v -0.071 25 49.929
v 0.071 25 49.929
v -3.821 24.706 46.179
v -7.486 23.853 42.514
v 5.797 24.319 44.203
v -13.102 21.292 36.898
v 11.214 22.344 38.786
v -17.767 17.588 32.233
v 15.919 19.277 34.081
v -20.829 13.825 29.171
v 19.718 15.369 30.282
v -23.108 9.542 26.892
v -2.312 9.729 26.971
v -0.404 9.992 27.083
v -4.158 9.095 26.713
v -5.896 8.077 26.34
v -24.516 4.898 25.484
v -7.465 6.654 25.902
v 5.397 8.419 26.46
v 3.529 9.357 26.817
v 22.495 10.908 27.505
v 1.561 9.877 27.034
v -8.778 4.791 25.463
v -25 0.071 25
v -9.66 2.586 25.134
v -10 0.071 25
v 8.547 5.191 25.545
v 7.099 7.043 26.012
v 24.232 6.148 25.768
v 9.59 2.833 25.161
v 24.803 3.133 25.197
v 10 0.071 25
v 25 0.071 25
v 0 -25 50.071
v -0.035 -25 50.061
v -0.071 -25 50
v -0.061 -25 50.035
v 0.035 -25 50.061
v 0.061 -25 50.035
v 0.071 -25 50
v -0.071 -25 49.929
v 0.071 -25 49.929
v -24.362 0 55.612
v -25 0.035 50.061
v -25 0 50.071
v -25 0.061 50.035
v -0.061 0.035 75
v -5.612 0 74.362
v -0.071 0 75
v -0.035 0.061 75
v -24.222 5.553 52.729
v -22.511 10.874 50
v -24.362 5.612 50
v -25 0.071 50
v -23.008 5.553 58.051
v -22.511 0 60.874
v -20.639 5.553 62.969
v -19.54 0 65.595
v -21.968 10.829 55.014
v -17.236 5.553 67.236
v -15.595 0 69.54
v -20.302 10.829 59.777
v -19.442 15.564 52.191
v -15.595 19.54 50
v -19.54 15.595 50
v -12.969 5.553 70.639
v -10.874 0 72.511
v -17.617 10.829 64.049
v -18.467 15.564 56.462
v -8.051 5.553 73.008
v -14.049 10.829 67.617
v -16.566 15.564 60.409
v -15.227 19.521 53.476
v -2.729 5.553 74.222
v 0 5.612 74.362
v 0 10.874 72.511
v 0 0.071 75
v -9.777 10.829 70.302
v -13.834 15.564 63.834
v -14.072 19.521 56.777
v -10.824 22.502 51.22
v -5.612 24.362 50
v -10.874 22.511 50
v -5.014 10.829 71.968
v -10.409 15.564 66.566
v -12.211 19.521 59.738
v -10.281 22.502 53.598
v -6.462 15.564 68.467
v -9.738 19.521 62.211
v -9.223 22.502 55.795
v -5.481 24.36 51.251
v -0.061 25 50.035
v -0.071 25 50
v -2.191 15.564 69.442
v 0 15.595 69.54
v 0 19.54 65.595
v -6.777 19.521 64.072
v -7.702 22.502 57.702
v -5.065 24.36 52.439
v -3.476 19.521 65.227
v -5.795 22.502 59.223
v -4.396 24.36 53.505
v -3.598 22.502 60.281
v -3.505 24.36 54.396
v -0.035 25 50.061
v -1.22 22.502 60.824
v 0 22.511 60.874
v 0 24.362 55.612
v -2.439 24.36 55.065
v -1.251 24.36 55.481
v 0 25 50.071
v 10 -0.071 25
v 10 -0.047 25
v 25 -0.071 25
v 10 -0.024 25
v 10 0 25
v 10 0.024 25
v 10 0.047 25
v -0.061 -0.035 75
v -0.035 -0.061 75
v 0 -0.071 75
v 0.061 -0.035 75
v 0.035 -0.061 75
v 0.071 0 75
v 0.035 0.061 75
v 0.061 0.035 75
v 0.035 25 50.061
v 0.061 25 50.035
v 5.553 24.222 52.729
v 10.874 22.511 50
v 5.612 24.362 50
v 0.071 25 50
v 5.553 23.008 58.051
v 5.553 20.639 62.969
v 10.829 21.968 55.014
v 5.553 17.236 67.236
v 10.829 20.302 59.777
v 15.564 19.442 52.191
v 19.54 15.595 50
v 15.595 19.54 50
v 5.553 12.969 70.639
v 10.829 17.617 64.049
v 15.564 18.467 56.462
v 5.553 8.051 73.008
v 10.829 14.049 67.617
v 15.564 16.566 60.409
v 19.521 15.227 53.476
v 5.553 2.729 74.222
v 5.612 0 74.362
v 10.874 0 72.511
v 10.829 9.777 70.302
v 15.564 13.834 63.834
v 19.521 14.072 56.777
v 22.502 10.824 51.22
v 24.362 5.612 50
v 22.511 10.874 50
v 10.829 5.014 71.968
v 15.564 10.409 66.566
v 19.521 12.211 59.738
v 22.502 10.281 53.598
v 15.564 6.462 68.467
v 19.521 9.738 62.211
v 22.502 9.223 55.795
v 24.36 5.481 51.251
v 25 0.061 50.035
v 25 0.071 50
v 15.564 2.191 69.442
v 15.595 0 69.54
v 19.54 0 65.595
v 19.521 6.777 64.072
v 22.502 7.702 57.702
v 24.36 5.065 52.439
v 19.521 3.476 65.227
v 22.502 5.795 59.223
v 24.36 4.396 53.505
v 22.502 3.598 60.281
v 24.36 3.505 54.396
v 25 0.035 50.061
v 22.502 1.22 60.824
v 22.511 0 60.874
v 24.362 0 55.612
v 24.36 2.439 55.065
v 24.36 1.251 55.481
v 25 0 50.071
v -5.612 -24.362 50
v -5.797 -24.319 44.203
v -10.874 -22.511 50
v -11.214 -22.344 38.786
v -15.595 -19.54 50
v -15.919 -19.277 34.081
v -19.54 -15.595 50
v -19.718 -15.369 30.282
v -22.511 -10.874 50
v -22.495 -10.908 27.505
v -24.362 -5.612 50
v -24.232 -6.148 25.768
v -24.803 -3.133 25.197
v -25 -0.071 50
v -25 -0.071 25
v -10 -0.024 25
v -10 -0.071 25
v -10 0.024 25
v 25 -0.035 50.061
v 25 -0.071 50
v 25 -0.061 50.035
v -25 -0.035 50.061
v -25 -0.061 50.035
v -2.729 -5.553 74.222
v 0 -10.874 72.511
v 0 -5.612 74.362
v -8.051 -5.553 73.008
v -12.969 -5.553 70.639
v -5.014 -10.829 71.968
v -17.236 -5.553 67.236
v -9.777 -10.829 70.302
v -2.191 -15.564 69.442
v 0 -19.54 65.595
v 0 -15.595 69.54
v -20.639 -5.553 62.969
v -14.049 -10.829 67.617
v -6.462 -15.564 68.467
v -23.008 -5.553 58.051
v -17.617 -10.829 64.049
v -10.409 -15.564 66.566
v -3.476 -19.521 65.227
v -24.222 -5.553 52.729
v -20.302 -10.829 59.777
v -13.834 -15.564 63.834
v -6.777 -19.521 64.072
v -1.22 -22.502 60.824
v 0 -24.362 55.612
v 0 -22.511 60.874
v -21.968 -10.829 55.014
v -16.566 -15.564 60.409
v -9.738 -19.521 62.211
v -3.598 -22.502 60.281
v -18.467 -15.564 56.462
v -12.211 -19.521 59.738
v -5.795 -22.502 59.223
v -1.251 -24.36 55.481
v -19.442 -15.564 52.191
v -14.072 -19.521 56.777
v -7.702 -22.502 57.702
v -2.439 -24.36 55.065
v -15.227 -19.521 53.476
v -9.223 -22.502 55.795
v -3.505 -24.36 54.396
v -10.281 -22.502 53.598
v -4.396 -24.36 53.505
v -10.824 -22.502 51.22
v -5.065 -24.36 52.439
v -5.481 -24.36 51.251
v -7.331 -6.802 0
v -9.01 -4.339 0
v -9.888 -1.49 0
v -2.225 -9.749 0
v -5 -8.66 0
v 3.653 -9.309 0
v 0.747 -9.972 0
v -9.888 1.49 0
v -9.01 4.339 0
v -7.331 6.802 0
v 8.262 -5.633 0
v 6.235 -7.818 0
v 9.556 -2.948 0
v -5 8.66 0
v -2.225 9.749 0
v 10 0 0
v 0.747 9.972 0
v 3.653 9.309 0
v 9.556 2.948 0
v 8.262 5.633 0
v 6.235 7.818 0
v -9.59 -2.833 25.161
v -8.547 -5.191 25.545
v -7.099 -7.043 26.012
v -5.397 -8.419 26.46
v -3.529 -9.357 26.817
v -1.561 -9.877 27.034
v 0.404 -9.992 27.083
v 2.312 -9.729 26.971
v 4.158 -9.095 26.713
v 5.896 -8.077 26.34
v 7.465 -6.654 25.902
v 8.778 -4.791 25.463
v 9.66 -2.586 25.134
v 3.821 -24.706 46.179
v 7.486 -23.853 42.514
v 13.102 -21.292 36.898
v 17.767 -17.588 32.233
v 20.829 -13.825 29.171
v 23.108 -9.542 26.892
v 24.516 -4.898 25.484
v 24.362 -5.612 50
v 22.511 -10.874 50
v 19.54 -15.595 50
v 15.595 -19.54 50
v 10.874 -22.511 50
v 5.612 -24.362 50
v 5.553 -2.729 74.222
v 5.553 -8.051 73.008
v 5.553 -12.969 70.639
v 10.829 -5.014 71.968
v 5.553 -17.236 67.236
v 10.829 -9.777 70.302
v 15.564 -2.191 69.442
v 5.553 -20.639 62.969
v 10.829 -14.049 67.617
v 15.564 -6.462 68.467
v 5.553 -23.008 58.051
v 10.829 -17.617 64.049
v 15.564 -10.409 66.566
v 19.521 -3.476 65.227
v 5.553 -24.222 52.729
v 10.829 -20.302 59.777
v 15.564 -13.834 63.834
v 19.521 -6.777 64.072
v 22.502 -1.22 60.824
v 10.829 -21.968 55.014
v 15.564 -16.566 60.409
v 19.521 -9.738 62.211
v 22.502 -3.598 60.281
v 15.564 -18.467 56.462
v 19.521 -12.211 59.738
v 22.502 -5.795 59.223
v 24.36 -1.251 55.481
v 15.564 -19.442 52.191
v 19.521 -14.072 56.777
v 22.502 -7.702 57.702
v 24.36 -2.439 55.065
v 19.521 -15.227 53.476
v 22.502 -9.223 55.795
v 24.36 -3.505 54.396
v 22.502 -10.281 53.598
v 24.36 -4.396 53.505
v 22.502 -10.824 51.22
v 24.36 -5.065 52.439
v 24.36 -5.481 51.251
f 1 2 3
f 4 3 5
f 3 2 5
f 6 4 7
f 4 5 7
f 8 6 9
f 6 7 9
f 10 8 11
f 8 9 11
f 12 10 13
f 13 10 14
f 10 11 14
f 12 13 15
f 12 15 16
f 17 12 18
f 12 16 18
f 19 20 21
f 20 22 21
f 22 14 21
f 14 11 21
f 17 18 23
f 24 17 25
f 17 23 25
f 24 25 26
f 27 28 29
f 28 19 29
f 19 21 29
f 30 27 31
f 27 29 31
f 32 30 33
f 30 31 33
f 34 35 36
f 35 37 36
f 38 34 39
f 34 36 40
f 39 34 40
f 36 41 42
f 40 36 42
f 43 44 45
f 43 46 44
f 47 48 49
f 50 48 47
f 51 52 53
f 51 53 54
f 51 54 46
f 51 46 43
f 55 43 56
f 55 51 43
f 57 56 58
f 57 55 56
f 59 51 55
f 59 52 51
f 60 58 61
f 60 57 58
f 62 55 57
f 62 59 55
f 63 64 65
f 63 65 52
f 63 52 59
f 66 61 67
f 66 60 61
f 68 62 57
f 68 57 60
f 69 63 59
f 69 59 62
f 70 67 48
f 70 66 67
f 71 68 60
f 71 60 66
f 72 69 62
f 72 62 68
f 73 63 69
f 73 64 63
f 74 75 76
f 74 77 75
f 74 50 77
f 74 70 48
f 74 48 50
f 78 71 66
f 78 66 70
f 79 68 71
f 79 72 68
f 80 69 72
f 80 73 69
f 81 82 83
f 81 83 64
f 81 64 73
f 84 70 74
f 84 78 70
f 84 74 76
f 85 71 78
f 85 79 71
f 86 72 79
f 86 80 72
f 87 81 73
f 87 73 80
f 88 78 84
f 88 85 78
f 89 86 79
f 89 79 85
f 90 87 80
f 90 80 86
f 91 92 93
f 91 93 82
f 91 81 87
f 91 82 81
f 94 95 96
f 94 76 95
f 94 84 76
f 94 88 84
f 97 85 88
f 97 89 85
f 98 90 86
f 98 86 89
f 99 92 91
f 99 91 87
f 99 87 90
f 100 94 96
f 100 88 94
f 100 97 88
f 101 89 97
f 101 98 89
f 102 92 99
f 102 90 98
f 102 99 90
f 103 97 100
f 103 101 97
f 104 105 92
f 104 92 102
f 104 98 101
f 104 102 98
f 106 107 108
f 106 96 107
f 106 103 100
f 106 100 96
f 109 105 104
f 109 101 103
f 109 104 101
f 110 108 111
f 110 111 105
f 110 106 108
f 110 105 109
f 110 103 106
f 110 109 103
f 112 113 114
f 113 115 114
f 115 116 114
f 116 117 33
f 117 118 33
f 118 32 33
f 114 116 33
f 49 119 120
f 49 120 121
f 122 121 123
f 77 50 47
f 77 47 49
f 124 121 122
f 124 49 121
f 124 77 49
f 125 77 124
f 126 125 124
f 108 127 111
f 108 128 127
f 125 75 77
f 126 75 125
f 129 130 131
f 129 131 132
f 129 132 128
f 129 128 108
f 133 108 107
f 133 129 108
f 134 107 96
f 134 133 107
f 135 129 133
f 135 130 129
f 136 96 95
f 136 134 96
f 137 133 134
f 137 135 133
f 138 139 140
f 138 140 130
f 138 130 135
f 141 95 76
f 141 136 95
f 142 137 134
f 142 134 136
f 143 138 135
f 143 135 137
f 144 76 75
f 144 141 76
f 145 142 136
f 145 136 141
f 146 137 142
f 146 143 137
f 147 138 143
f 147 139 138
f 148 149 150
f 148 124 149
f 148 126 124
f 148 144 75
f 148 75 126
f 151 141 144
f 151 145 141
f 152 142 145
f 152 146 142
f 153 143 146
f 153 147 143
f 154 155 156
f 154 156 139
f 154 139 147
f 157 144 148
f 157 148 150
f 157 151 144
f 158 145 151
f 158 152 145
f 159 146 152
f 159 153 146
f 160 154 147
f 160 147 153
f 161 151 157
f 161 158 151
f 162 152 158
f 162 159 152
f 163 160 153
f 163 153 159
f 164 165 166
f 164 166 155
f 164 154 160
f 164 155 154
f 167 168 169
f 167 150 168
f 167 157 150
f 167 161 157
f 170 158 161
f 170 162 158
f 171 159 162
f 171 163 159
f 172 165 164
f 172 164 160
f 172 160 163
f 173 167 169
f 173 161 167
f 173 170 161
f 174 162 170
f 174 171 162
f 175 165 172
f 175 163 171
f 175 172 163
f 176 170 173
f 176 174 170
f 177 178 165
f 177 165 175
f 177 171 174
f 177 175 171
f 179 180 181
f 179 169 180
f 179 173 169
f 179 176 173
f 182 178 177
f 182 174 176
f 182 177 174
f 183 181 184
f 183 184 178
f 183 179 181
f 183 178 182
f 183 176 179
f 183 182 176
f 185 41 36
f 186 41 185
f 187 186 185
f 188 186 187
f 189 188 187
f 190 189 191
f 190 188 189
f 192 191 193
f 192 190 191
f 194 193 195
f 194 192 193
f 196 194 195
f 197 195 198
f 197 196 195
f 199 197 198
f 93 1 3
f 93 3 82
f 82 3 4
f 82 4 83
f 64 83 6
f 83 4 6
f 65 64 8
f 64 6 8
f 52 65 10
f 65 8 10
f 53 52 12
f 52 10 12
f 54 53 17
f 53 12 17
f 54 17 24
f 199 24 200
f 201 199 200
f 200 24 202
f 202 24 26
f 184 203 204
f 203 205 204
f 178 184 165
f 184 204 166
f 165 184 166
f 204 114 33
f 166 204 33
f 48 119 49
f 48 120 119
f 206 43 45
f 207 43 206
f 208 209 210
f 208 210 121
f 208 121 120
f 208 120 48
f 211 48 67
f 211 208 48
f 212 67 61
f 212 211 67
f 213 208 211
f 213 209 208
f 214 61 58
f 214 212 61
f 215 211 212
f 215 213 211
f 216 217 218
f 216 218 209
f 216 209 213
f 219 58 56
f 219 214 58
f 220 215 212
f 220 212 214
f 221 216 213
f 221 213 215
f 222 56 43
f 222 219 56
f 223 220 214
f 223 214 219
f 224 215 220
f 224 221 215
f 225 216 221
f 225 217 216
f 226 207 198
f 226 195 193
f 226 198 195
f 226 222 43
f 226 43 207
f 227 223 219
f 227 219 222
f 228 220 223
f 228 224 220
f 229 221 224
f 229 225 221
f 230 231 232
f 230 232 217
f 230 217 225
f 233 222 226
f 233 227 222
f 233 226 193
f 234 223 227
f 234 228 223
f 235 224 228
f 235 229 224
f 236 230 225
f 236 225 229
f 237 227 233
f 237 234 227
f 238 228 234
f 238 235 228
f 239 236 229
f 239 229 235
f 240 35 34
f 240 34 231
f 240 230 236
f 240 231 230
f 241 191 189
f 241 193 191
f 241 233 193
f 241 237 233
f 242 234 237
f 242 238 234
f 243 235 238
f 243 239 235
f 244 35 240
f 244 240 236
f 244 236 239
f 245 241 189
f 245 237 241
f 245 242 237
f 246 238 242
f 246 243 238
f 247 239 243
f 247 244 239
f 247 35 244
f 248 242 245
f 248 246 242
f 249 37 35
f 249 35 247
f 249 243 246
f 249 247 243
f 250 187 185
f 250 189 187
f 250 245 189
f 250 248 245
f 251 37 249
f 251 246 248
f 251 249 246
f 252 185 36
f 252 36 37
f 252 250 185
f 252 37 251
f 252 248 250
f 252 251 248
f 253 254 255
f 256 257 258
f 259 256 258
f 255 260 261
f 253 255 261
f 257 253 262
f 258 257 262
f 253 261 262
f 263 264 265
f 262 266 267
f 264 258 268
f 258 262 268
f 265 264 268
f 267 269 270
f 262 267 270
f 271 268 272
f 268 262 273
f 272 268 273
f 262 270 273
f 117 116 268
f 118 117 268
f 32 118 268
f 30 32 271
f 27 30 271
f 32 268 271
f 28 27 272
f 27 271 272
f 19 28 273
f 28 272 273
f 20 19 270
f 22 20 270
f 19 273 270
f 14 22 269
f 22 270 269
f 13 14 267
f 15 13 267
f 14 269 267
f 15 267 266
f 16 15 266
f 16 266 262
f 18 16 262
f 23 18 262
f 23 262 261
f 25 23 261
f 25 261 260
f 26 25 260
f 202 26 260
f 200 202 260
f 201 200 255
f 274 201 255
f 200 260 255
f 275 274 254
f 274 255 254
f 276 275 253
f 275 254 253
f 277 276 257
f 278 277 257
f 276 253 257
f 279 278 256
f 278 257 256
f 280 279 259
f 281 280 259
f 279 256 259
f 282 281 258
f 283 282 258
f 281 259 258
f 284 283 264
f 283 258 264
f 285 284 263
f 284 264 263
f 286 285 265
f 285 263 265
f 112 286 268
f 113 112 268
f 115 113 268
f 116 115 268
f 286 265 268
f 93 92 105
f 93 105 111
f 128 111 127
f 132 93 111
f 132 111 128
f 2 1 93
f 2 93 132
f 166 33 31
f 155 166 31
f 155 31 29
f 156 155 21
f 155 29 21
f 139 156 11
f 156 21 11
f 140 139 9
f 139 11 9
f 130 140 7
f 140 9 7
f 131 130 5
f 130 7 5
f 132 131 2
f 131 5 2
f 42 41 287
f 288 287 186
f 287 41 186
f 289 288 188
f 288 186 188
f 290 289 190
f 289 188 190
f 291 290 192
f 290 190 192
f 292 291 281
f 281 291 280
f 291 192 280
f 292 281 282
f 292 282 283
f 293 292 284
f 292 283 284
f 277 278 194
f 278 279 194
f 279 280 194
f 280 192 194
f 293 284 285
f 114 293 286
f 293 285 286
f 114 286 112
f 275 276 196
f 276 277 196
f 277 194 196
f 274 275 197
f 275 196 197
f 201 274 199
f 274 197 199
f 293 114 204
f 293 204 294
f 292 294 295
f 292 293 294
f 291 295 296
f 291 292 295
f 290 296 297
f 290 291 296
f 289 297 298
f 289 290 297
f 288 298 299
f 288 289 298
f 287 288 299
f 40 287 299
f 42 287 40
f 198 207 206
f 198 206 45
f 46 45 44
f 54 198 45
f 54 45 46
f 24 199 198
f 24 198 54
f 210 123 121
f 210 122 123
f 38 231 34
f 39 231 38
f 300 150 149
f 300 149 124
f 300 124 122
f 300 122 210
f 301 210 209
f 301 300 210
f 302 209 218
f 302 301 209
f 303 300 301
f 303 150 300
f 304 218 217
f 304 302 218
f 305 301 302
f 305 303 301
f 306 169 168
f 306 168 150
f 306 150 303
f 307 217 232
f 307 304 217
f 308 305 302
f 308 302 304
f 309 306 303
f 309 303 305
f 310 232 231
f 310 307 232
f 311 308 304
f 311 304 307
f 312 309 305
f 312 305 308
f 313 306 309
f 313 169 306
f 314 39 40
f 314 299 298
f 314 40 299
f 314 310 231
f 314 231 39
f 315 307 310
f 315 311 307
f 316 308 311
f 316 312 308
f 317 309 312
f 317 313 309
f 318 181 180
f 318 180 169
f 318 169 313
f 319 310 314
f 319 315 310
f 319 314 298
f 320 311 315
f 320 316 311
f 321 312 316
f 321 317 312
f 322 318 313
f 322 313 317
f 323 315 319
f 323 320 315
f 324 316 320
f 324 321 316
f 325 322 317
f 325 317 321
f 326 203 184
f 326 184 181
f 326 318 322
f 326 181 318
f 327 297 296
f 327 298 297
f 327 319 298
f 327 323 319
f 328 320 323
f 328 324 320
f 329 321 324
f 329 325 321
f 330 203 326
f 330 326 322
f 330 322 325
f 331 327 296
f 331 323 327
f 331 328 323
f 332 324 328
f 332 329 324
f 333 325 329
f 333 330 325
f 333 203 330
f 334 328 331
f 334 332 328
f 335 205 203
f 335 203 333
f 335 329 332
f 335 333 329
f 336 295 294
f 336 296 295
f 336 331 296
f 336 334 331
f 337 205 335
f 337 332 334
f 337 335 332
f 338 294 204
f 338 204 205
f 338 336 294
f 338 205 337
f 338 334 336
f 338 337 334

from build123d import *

# Parameters (mm, degrees)
F0_R         = 10
F1_DEPTH     = 25
F2_W         = 50
F2_H         = 50
F3_DEPTH     = 50
F4_T1_DEPTH  = 87.4998500005
F4_T3_DEPTH  = 0.0002
F4_T5_DEPTH  = 0.0002
F4_S9_W      = 25.5
F4_S9_H      = 25.5
F4_T10_DEPTH = 25.5
F4_S15_W     = 25.5
F4_S15_H     = 25.5
F4_T16_DEPTH = 25.5
F4_S21_W     = 25.5
F4_S21_H     = 25.5
F4_T22_DEPTH = 25.5
F4_S27_W     = 25.5
F4_S27_H     = 25.5
F4_T28_DEPTH = 25.5
F4_T34_DEPTH = 174.999500001
F4_S35_R     = 10
F4_T36_DEPTH = 91
F4_T40_DEPTH = 174.999500001
F4_S41_R     = 10
F4_T42_DEPTH = 91


# Not quite as in the source:
# - a fillet or chamfer that OpenCascade refuses, or shapes differently, is made with other operations: its cross-section is extruded or revolved along the edge and cut away or added


with BuildPart() as f1:
    # F0 (on Top) → F1 (new body)
    with BuildSketch(Plane.XY):
        Circle(F0_R)
    extrude(amount=F1_DEPTH)

    # F2 (on face) → F3 (join)
    with BuildSketch(Plane.XY.offset(25)):
        Rectangle(F2_W, F2_H)
    extrude(amount=F3_DEPTH)

    # F4: fillet of radius 25 on 10 edges, made by hand

    # F4_s2 → F4_t1 (cut)
    with BuildSketch(Plane.XY.offset(-37.4997500005)):
        with BuildLine():
            ThreePointArc((-0.0001, -25.0001), (-17.6777695297, -17.6777695297), (-25.0001, -0.0001))
            Line((-25.0001, -0.0001), (-25.5001, -0.0001))
            ThreePointArc((-25.5001, -0.0001), (-25.5, -12.50005), (-25.5, -25))
            Line((-25.5, -25), (-25, -25.5))
            ThreePointArc((-25, -25.5), (-12.50005, -25.5), (-0.0001, -25.5001))
            Line((-0.0001, -25.5001), (-0.0001, -25.0001))
        make_face()
        with BuildLine():
            ThreePointArc((25.0001, -0.0001), (17.6777695297, -17.6777695297), (0.0001, -25.0001))
            Line((0.0001, -25.0001), (0.0001, -25.5001))
            ThreePointArc((0.0001, -25.5001), (12.50005, -25.5), (25, -25.5))
            Line((25, -25.5), (25.5, -25))
            ThreePointArc((25.5, -25), (25.5, -12.50005), (25.5001, -0.0001))
            Line((25.5001, -0.0001), (25.0001, -0.0001))
        make_face()
        with BuildLine():
            ThreePointArc((25.0001, 0.0001), (17.6777695297, 17.6777695297), (0.0001, 25.0001))
            Line((0.0001, 25.0001), (0.0001, 25.5001))
            ThreePointArc((0.0001, 25.5001), (12.50005, 25.5), (25, 25.5))
            Line((25, 25.5), (25.5, 25))
            ThreePointArc((25.5, 25), (25.5, 12.50005), (25.5001, 0.0001))
            Line((25.5001, 0.0001), (25.0001, 0.0001))
        make_face()
        with BuildLine():
            ThreePointArc((-0.0001, 25.0001), (-17.6777695297, 17.6777695297), (-25.0001, 0.0001))
            Line((-25.0001, 0.0001), (-25.5001, 0.0001))
            ThreePointArc((-25.5001, 0.0001), (-25.5, 12.50005), (-25.5, 25))
            Line((-25.5, 25), (-25, 25.5))
            ThreePointArc((-25, 25.5), (-12.50005, 25.5), (-0.0001, 25.5001))
            Line((-0.0001, 25.5001), (-0.0001, 25.0001))
        make_face()
    extrude(amount=F4_T1_DEPTH, mode=Mode.SUBTRACT)

    # F4_s4 → F4_t3 (cut)
    with BuildSketch(Plane.YZ.offset(-0.0001)):
        with BuildLine():
            ThreePointArc((-25.0001, 50.0001), (-17.6777695297, 67.6777695297), (-0.0001, 75.0001))
            Line((-0.0001, 75.0001), (-0.0001, 75.5001))
            ThreePointArc((-0.0001, 75.5001), (-12.50005, 75.5), (-25, 75.5))
            Line((-25, 75.5), (-25.5, 75))
            ThreePointArc((-25.5, 75), (-25.5, 62.50005), (-25.5001, 50.0001))
            Line((-25.5001, 50.0001), (-25.0001, 50.0001))
        make_face()
        with BuildLine():
            ThreePointArc((25.0001, 50.0001), (17.6777695297, 67.6777695297), (0.0001, 75.0001))
            Line((0.0001, 75.0001), (0.0001, 75.5001))
            ThreePointArc((0.0001, 75.5001), (12.50005, 75.5), (25, 75.5))
            Line((25, 75.5), (25.5, 75))
            ThreePointArc((25.5, 75), (25.5, 62.50005), (25.5001, 50.0001))
            Line((25.5001, 50.0001), (25.0001, 50.0001))
        make_face()
    extrude(amount=F4_T3_DEPTH, mode=Mode.SUBTRACT)

    # F4_s6 → F4_t5 (cut)
    with BuildSketch(Plane.XZ.offset(-0.0001)):
        with BuildLine():
            ThreePointArc((25.0001, 50.0001), (17.6777695297, 67.6777695297), (0.0001, 75.0001))
            Line((0.0001, 75.0001), (0.0001, 75.5001))
            ThreePointArc((0.0001, 75.5001), (12.50005, 75.5), (25, 75.5))
            Line((25, 75.5), (25.5, 75))
            ThreePointArc((25.5, 75), (25.5, 62.50005), (25.5001, 50.0001))
            Line((25.5001, 50.0001), (25.0001, 50.0001))
        make_face()
        with BuildLine():
            ThreePointArc((-0.0001, 75.0001), (-17.6777695297, 67.6777695297), (-25.0001, 50.0001))
            Line((-25.0001, 50.0001), (-25.5001, 50.0001))
            ThreePointArc((-25.5001, 50.0001), (-25.5, 62.50005), (-25.5, 75))
            Line((-25.5, 75), (-25, 75.5))
            ThreePointArc((-25, 75.5), (-12.50005, 75.5), (-0.0001, 75.5001))
            Line((-0.0001, 75.5001), (-0.0001, 75.0001))
        make_face()
    extrude(amount=F4_T5_DEPTH, mode=Mode.SUBTRACT)


with BuildPart() as f4_tool8:
    # F4_s9 → F4_t10 (new body)
    with BuildSketch(Plane.XZ.offset(0.0001)):
        with Locations((-12.7501, 62.7501)):
            Rectangle(F4_S9_W, F4_S9_H)
    extrude(amount=F4_T10_DEPTH)

    # F4_s11 → F4_t12 (revolve, cut)
    with BuildSketch(Plane(origin=(-0.0001, -0.0001, 50.0001), x_dir=(0.7071067812, 0, -0.7071067812), z_dir=(-0.7071067812, 0, -0.7071067812))):
        with BuildLine():
            ThreePointArc((0, -25), (25, 0), (0, 25))
            Line((0, 25), (0, -25))
        make_face()
    revolve(axis=Axis((-0.0001, -0.0001, 50.0001), (0, -1, 0)), mode=Mode.SUBTRACT)


with BuildPart() as f1_1:
    add(f1.part)

    # F4_t7: cut F4_tool8
    add(f4_tool8.part, mode=Mode.SUBTRACT)


with BuildPart() as f4_tool14:
    # F4_s15 → F4_t16 (new body)
    with BuildSketch(Plane.YZ.offset(0.0001)):
        with Locations((-12.7501, 62.7501)):
            Rectangle(F4_S15_W, F4_S15_H)
    extrude(amount=F4_T16_DEPTH)

    # F4_s17 → F4_t18 (revolve, cut)
    with BuildSketch(Plane(origin=(0.0001, -0.0001, 50.0001), x_dir=(0, 0.7071067812, -0.7071067812), z_dir=(0, -0.7071067812, -0.7071067812))):
        with BuildLine():
            ThreePointArc((0, -25), (25, 0), (0, 25))
            Line((0, 25), (0, -25))
        make_face()
    revolve(axis=Axis((0.0001, -0.0001, 50.0001), (1, 0, 0)), mode=Mode.SUBTRACT)


with BuildPart() as f1_2:
    add(f1_1.part)

    # F4_t13: cut F4_tool14
    add(f4_tool14.part, mode=Mode.SUBTRACT)


with BuildPart() as f4_tool20:
    # F4_s21 → F4_t22 (new body)
    with BuildSketch(Plane.YZ.offset(0.0001)):
        with Locations((12.7501, 62.7501)):
            Rectangle(F4_S21_W, F4_S21_H)
    extrude(amount=F4_T22_DEPTH)

    # F4_s23 → F4_t24 (revolve, cut)
    with BuildSketch(Plane(origin=(0.0001, 0.0001, 50.0001), x_dir=(0, -0.7071067812, -0.7071067812), z_dir=(0, -0.7071067812, 0.7071067812))):
        with BuildLine():
            ThreePointArc((0, -25), (25, 0), (0, 25))
            Line((0, 25), (0, -25))
        make_face()
    revolve(axis=Axis((0.0001, 0.0001, 50.0001), (1, 0, 0)), mode=Mode.SUBTRACT)


with BuildPart() as f1_3:
    add(f1_2.part)

    # F4_t19: cut F4_tool20
    add(f4_tool20.part, mode=Mode.SUBTRACT)


with BuildPart() as f4_tool26:
    # F4_s27 → F4_t28 (new body)
    with BuildSketch(Plane.XZ.offset(-0.0001)):
        with Locations((-12.7501, 62.7501)):
            Rectangle(F4_S27_W, F4_S27_H)
    extrude(amount=-F4_T28_DEPTH)

    # F4_s29 → F4_t30 (revolve, cut)
    with BuildSketch(Plane(origin=(-0.0001, 0.0001, 50.0001), x_dir=(0.7071067812, 0, -0.7071067812), z_dir=(0.7071067812, 0, 0.7071067812))):
        with BuildLine():
            ThreePointArc((0, -25), (25, 0), (0, 25))
            Line((0, 25), (0, -25))
        make_face()
    revolve(axis=Axis((-0.0001, 0.0001, 50.0001), (0, 1, 0)), mode=Mode.SUBTRACT)


with BuildPart() as f1_4:
    add(f1_3.part)

    # F4_t25: cut F4_tool26
    add(f4_tool26.part, mode=Mode.SUBTRACT)


with BuildPart() as f4_tool32:
    # F4_s33 → F4_t34 (new body)
    with BuildSketch(Plane.YZ.offset(-87.4997500005)):
        with BuildLine():
            ThreePointArc((-25.0001, 49.9999), (-17.6777695297, 32.3222304703), (-0.0001, 24.9999))
            Line((-0.0001, 24.9999), (-0.0001, 24.4999))
            ThreePointArc((-0.0001, 24.4999), (-12.50005, 24.5), (-25, 24.5))
            Line((-25, 24.5), (-25.5, 25))
            ThreePointArc((-25.5, 25), (-25.5, 37.49995), (-25.5001, 49.9999))
            Line((-25.5001, 49.9999), (-25.0001, 49.9999))
        make_face()
    extrude(amount=F4_T34_DEPTH)

    # F4_s35 → F4_t36 (cut, symmetric)
    with BuildSketch(Plane.XY.offset(37.2)):
        Circle(F4_S35_R)
    extrude(amount=F4_T36_DEPTH, both=True, mode=Mode.SUBTRACT)


with BuildPart() as f1_5:
    add(f1_4.part)

    # F4_t31: cut F4_tool32
    add(f4_tool32.part, mode=Mode.SUBTRACT)


with BuildPart() as f4_tool38:
    # F4_s39 → F4_t40 (new body)
    with BuildSketch(Plane.YZ.offset(87.4997500005)):
        with BuildLine():
            ThreePointArc((25.0001, 49.9999), (17.6777695297, 32.3222304703), (0.0001, 24.9999))
            Line((0.0001, 24.9999), (0.0001, 24.4999))
            ThreePointArc((0.0001, 24.4999), (12.50005, 24.5), (25, 24.5))
            Line((25, 24.5), (25.5, 25))
            ThreePointArc((25.5, 25), (25.5, 37.49995), (25.5001, 49.9999))
            Line((25.5001, 49.9999), (25.0001, 49.9999))
        make_face()
    extrude(amount=-F4_T40_DEPTH)

    # F4_s41 → F4_t42 (cut, symmetric)
    with BuildSketch(Plane.XY.offset(37.2)):
        Circle(F4_S41_R)
    extrude(amount=F4_T42_DEPTH, both=True, mode=Mode.SUBTRACT)


with BuildPart() as f1_6:
    add(f1_5.part)

    # F4_t37: cut F4_tool38
    add(f4_tool38.part, mode=Mode.SUBTRACT)


solid = f1_6.part
